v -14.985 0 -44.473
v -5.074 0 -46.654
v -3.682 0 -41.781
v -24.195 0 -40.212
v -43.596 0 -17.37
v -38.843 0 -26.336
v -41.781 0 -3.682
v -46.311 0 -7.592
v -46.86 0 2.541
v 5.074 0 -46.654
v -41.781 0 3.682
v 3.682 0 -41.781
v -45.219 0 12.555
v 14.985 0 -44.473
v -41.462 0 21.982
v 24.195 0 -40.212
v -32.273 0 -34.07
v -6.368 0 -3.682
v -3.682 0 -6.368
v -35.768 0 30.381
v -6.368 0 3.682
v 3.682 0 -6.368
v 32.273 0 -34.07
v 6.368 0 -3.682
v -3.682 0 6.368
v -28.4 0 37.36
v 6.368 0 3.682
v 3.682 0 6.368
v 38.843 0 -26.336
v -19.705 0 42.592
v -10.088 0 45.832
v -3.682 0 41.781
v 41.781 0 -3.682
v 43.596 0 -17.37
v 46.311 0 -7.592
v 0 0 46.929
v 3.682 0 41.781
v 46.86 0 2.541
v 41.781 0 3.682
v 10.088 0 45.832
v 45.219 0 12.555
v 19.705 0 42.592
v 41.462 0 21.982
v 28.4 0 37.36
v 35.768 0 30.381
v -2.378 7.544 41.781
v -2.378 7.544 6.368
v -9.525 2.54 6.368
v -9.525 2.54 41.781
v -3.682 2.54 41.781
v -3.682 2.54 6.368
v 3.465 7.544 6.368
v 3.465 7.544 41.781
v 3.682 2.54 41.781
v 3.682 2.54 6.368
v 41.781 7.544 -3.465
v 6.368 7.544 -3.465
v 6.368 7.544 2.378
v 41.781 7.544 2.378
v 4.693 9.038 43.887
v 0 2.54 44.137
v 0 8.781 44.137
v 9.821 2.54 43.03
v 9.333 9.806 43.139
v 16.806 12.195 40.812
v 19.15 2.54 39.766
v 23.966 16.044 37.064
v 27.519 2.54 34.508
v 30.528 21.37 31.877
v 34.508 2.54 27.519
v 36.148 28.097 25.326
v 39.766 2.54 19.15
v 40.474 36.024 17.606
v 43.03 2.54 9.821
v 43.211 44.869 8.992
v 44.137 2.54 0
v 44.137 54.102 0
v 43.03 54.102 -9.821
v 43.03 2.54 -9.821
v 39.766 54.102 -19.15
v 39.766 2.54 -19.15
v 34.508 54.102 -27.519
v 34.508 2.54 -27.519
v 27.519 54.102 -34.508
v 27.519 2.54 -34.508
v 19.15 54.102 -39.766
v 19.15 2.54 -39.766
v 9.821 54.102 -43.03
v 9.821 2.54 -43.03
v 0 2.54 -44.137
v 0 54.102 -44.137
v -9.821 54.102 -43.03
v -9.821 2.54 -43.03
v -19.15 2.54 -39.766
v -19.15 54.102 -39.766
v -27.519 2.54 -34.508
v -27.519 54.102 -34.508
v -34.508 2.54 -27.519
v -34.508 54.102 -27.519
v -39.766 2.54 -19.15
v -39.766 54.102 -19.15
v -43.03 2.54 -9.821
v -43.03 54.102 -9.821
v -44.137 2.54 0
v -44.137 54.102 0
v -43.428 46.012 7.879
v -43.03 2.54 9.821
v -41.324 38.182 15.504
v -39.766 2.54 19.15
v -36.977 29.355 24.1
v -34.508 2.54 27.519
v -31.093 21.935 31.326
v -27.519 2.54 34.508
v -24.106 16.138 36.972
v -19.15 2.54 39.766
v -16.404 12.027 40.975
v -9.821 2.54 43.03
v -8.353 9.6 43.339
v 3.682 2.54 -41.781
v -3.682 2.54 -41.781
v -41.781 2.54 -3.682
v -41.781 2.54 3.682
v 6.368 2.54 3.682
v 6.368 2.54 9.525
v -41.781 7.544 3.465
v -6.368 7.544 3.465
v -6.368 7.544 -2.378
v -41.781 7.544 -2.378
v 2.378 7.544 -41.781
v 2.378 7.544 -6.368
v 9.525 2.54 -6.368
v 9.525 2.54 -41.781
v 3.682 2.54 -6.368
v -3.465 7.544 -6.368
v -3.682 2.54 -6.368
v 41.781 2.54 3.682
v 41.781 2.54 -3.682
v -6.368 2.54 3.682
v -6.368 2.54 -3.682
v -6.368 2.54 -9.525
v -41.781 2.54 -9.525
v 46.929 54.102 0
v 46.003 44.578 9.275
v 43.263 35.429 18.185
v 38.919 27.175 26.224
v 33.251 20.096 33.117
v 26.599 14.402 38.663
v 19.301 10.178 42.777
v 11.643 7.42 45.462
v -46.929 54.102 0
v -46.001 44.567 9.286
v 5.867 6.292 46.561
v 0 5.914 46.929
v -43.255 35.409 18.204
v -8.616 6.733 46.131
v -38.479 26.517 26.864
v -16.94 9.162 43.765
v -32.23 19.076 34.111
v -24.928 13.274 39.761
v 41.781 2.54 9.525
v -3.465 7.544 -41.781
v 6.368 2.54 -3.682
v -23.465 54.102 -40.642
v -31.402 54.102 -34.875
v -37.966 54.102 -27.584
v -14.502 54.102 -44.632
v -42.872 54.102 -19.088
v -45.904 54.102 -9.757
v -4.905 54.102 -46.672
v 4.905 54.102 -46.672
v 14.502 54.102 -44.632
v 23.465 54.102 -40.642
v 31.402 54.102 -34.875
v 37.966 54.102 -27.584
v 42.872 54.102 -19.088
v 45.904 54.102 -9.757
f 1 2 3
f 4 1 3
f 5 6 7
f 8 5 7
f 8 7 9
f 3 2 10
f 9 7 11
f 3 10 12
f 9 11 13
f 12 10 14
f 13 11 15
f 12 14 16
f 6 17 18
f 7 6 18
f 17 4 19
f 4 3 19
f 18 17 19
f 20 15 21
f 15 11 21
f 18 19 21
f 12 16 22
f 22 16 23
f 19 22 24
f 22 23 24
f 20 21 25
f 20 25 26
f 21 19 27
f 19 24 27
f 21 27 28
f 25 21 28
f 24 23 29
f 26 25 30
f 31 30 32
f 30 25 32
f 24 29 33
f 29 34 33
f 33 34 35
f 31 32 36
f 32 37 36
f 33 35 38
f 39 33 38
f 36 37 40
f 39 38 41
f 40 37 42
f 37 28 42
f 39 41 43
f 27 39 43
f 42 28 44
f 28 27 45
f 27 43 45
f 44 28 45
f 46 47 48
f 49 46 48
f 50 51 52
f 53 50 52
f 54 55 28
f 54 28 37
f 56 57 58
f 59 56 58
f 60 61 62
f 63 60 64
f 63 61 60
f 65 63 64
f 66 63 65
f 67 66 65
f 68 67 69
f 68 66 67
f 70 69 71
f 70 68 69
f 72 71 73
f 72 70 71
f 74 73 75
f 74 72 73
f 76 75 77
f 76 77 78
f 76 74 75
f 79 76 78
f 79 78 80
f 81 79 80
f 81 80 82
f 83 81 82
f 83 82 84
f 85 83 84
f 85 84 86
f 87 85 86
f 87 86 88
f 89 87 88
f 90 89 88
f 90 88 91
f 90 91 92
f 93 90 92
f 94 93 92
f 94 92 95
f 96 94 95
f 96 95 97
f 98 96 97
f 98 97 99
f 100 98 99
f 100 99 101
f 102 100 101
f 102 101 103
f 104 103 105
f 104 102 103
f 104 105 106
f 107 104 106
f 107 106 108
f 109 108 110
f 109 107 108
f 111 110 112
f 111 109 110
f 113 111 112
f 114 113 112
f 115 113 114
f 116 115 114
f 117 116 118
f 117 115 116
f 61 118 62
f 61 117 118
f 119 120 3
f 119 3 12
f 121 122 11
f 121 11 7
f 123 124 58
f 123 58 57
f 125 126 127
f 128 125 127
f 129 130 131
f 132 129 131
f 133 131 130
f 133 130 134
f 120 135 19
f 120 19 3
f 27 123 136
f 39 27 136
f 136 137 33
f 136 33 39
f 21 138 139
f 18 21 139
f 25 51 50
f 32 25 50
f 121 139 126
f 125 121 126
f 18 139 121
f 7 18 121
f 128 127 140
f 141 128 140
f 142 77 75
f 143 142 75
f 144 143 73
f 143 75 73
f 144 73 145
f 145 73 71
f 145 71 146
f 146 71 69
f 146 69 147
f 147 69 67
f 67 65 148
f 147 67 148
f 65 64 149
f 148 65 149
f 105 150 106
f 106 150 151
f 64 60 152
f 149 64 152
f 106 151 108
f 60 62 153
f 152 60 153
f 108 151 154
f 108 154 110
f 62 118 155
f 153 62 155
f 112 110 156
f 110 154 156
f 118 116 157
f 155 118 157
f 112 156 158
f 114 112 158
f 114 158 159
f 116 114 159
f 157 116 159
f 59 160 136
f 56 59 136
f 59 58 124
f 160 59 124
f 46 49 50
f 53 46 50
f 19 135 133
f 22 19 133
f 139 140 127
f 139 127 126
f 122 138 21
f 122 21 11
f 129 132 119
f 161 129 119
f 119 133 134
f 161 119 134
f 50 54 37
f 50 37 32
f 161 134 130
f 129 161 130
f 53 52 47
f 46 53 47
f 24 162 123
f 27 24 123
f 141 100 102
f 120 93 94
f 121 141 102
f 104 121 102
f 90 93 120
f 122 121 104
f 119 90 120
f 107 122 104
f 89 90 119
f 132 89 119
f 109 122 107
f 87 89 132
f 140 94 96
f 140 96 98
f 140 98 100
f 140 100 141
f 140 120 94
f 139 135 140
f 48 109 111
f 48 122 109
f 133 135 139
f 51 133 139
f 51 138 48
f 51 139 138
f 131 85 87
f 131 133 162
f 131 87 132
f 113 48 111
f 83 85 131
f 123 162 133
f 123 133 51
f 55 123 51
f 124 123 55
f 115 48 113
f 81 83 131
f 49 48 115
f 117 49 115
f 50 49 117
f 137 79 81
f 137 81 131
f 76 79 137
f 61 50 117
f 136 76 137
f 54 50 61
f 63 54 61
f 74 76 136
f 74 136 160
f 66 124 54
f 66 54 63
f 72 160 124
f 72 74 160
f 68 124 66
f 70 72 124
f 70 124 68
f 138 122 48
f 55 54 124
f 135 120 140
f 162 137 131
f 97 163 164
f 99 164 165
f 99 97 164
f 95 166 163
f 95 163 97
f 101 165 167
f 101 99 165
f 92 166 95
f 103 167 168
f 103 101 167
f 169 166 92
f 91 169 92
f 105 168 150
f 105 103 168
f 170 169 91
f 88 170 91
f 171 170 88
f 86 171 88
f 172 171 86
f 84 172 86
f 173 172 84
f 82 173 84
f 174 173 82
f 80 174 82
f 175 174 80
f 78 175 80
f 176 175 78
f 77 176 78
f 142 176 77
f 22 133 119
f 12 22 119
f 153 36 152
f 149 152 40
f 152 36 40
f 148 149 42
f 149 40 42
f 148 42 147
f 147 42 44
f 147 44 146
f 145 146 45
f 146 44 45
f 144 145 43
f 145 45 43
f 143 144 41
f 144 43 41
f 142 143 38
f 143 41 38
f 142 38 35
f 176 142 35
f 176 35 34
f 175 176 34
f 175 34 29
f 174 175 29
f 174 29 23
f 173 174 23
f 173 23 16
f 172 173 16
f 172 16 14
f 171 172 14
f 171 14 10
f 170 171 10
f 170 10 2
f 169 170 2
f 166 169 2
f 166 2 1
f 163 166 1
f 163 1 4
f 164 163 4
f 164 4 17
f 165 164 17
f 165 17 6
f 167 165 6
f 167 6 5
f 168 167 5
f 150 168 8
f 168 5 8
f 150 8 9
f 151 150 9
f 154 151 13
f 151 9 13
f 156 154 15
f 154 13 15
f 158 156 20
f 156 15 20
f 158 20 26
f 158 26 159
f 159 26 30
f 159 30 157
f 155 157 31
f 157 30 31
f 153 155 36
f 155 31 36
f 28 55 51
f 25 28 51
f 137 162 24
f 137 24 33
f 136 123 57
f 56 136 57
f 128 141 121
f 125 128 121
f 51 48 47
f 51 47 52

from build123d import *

# Parameters (mm, degrees)
SKETCH1_R               = 44.137005248
BOSS_EXTRUDE1_DEPTH     = 2.54
SKETCH2_W               = 7.363975328
SKETCH2_H               = 35.413609254
CUT_EXTRUDE1_DEPTH      = 2.54
BOSS_EXTRUDE2_START     = -6.36773
BOSS_EXTRUDE2_DEPTH     = 35.413609254
CIRPATTERN3_COUNT       = 4
SKETCH6_R               = 46.929171811
SKETCH6_R_2             = 44.137005248
BOSS_EXTRUDE3_DEPTH     = 54.102
CUT_EXTRUDE2_DEPTH      = 86.62546781
CUT_EXTRUDE2_DEPTH_BACK = 86.62546781


with BuildPart() as part:
    # Sketch1 → Boss-Extrude1 (new body)
    with BuildSketch(Plane(origin=(0, 0, 0), x_dir=(1, 0, 0), z_dir=(0, 1, 0))):
        with Locations(Location((0, 0, 0), (0, 0, 270))):
            Circle(SKETCH1_R)
    extrude(amount=BOSS_EXTRUDE1_DEPTH)

    # Sketch2 → Cut-Extrude1 (cut)
    with BuildSketch(Plane(origin=(0, 2.54, 0), x_dir=(1, 0, 0), z_dir=(0, 1, 0))):
        with Locations((0, 24.074534725)):
            Rectangle(SKETCH2_W, SKETCH2_H)
    cut_extrude1 = extrude(amount=-CUT_EXTRUDE1_DEPTH, mode=Mode.SUBTRACT)

    # Sketch3 → Boss-Extrude2 (add)
    with BuildSketch(Plane.XY.offset(BOSS_EXTRUDE2_START)):
        Polygon((3.681987664, 2.54), (-3.464612865, 7.544103563), (2.37831785, 7.544103563), (9.524918378, 2.54), align=None)
    boss_extrude2 = extrude(amount=-BOSS_EXTRUDE2_DEPTH)

    # CirPattern3: Cut-Extrude1, Boss-Extrude2 ×4 about axis
    cirpattern3_axis = Axis((0, 0, 0), (0, 1, 0))
    add([cut_extrude1.rotate(cirpattern3_axis, i * 360 / CIRPATTERN3_COUNT) for i in range(1, CIRPATTERN3_COUNT)], mode=Mode.SUBTRACT)
    add([boss_extrude2.rotate(cirpattern3_axis, i * 360 / CIRPATTERN3_COUNT) for i in range(1, CIRPATTERN3_COUNT)])

    # Sketch6 → Boss-Extrude3 (add)
    with BuildSketch(Plane(origin=(0, 0, 0), x_dir=(1, 0, 0), z_dir=(0, 1, 0))):
        with Locations(Location((0, 0, 0), (0, 0, 270))):
            Circle(SKETCH6_R)
        with Locations(Location((0, 0, 0), (0, 0, 270))):
            Circle(SKETCH6_R_2, mode=Mode.SUBTRACT)
    extrude(amount=BOSS_EXTRUDE3_DEPTH)

    # Sketch7 → Cut-Extrude2 (cut, two sides: drawn at the far end of the back side and taken through both)
    with BuildSketch(Plane(origin=(0, 0, 0), x_dir=(0, 0, -1), z_dir=(1, 0, 0)).offset(-CUT_EXTRUDE2_DEPTH_BACK)):
        Polygon((0, 54.102), (-46.929171811, 5.913652035), (-46.929171811, 54.102), align=None)
    extrude(amount=CUT_EXTRUDE2_DEPTH + CUT_EXTRUDE2_DEPTH_BACK, mode=Mode.SUBTRACT)


solid = part.part
